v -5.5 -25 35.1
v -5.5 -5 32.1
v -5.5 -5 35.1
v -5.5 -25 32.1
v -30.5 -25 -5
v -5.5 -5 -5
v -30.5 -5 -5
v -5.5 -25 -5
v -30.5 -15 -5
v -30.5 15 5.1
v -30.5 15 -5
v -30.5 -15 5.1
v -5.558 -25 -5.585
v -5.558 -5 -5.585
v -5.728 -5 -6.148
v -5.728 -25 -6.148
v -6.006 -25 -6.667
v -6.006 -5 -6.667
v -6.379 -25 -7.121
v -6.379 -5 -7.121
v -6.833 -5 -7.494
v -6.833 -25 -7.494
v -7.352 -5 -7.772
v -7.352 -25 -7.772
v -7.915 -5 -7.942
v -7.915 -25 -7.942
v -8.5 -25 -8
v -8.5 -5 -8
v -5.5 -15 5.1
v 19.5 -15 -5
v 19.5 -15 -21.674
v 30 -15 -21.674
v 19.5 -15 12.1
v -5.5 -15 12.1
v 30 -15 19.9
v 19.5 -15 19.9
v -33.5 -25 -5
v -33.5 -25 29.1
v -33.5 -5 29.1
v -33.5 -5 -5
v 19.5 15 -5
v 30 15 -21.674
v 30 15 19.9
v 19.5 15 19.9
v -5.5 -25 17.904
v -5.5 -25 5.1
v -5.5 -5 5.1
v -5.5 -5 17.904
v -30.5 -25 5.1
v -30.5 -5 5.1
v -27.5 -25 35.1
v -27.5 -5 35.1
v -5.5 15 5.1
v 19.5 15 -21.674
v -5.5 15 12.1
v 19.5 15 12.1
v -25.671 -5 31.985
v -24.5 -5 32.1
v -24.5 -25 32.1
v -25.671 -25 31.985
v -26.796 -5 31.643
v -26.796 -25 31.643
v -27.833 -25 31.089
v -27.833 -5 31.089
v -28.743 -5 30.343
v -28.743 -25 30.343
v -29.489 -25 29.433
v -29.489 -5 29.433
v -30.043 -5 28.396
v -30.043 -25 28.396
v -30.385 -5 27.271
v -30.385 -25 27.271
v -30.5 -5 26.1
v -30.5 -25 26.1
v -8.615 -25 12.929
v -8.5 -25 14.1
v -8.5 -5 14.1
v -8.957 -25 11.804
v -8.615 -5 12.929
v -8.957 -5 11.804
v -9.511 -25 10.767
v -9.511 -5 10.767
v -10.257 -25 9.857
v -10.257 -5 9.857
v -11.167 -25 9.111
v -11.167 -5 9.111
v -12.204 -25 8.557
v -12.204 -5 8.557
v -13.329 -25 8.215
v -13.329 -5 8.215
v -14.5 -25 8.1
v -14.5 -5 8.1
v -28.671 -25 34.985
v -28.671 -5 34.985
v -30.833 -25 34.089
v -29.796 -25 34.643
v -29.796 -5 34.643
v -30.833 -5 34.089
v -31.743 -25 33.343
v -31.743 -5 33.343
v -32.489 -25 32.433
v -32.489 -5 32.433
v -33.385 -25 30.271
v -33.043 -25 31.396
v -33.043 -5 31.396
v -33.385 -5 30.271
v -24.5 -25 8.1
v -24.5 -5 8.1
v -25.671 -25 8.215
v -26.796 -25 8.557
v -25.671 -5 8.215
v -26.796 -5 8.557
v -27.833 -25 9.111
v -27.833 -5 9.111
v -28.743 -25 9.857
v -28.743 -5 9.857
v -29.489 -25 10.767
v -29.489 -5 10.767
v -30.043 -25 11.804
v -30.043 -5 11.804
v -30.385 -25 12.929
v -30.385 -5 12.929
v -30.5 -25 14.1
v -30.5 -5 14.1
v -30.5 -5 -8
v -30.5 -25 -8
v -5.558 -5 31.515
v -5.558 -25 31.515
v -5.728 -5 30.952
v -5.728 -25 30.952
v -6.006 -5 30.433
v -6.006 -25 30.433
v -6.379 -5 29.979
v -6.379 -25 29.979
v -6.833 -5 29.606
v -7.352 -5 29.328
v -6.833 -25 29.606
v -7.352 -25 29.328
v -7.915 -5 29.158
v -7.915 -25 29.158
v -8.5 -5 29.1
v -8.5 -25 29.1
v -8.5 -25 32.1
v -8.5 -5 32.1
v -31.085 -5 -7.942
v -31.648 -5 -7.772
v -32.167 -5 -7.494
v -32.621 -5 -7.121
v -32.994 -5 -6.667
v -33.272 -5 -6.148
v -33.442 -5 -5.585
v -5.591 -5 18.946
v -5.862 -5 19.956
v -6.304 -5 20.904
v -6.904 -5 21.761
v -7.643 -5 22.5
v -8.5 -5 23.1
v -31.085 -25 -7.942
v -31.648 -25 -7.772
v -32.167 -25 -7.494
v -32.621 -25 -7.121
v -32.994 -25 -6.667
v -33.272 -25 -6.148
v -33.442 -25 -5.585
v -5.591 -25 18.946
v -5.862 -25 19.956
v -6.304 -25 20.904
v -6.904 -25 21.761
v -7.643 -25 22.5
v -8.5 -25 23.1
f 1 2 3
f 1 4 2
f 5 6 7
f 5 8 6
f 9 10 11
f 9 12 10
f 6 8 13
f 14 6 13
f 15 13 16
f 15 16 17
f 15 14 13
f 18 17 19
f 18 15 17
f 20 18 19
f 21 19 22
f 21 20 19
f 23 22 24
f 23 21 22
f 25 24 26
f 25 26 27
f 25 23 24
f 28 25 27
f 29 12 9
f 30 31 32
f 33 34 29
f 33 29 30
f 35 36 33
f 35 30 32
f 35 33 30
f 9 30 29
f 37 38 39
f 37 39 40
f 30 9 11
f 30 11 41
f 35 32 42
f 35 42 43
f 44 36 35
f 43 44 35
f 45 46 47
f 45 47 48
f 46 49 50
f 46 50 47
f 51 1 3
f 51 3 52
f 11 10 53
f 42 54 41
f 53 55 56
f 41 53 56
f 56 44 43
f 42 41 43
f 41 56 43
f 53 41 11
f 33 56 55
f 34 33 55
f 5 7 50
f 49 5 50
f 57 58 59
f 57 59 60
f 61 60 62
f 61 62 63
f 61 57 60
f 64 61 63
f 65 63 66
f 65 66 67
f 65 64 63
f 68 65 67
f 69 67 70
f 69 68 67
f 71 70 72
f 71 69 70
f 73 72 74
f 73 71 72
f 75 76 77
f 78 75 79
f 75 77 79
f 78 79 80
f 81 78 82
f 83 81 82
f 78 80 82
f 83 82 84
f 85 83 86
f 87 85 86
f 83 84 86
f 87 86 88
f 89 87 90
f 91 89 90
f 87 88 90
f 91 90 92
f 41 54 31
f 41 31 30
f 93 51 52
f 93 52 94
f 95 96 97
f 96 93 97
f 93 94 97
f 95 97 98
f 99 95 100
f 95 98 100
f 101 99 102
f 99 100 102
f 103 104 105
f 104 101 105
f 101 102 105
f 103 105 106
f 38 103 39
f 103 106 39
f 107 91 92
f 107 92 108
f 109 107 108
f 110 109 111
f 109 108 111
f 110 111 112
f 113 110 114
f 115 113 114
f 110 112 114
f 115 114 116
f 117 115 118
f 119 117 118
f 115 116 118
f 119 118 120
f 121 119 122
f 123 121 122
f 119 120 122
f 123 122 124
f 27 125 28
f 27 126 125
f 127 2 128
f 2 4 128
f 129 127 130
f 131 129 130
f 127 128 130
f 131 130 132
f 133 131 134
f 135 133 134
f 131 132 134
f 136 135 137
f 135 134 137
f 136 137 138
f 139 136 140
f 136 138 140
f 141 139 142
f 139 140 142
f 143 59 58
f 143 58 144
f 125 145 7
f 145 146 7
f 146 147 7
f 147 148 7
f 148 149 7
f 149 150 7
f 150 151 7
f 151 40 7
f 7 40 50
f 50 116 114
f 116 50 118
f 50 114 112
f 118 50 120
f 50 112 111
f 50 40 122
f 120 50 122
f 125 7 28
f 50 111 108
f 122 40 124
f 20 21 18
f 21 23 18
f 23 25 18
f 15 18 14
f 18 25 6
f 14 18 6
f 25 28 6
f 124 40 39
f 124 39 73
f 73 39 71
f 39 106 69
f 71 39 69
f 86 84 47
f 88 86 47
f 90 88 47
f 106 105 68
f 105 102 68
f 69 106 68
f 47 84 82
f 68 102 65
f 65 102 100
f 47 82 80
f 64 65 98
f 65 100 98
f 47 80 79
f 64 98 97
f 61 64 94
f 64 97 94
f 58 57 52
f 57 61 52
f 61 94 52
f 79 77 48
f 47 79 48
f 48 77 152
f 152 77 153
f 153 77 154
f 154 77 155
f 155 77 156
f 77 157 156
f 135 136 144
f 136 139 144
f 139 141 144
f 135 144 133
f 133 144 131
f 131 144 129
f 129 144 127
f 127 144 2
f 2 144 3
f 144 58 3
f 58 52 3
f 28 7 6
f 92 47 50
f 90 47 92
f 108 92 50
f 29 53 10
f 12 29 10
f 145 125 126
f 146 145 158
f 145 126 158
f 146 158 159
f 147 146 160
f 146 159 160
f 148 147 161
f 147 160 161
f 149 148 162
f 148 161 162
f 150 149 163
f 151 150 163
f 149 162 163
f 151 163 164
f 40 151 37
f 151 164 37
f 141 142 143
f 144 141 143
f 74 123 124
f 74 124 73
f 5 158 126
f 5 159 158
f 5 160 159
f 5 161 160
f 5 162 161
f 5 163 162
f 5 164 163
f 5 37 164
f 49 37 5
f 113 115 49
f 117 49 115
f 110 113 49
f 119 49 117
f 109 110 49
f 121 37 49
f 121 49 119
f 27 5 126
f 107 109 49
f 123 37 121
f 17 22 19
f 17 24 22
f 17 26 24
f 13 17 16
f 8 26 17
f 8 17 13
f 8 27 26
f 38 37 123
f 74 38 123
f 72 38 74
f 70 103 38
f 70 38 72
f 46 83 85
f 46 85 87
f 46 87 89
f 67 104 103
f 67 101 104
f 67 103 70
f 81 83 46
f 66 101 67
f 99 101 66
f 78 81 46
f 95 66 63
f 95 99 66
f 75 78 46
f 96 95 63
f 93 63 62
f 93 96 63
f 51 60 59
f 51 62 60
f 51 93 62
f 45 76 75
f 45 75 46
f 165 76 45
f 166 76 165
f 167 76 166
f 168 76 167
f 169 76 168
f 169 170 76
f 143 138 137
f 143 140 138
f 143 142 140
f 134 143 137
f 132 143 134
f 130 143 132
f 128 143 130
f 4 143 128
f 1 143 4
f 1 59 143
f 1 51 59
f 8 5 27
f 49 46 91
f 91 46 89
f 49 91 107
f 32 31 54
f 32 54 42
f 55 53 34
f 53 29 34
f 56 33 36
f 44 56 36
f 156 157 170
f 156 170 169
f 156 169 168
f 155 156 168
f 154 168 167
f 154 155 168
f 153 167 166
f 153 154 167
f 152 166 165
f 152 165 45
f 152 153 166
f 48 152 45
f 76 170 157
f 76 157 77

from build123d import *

# Parameters (mm, degrees)
F0_W          = 25
F0_H          = 7
F0_W_2        = 10.5
F0_H_2        = 10.1
F0_H_3        = 16.6735936701
F0_H_4        = 7.8
F1_DEPTH      = 15
F1_DEPTH_BACK = 15
F2_W          = 3
F2_H          = 3
F3_DEPTH      = 10
F3_DEPTH_BACK = 10
F4_T1_DEPTH   = 20
F4_T3_DEPTH   = 20
F4_T5_DEPTH   = 20
F4_T7_DEPTH   = 50
F4_T9_DEPTH   = 45.9807621135
F5_R          = 2.99999


# Not quite as in the source:
# - a fillet or chamfer that OpenCascade refuses, or shapes differently, is made with other operations: its cross-section is extruded or revolved along the edge and cut away or added
# - a fillet or chamfer is up to 0.001 mm smaller than in the source, because OpenCascade refuses the exact size
# - a feature names something its author has since deleted; it is built from what else it names


with BuildPart() as f1:
    # F0 (on Front) → F1 (new body, two sides)
    with BuildSketch(Plane.XZ) as f1_sk:
        Polygon((-5.5, 5.1), (-30.5, 5.1), (-30.5, -5), (19.5, -5), (19.5, 5.1), align=None)
        with Locations((7, 8.6)):
            Rectangle(F0_W, F0_H)
        with Locations((24.75, 8.6)):
            Rectangle(F0_W_2, F0_H)
        with Locations((24.75, 0.05)):
            Rectangle(F0_W_2, F0_H_2)
        with Locations((24.75, -13.3367968351)):
            Rectangle(F0_W_2, F0_H_3)
        with Locations((24.75, 16)):
            Rectangle(F0_W_2, F0_H_4)
    extrude(amount=F1_DEPTH)
    extrude(f1_sk.sketch, amount=-F1_DEPTH_BACK)


with BuildPart() as f3:
    # F2 (on face) → F3 (new body, two sides)
    with BuildSketch(Plane.XZ.offset(15)) as f3_sk:
        Polygon((-30.5, -5), (-30.5, 5.1), (-5.5, 5.1), (-5.5, 12.1), (-5.5, 23.1), (-8.5, 23.1), (-8.5, 15.1), (-8.5, 8.1), (-30.5, 8.1), (-30.5, 32.1), (-8.5, 32.1), (-5.5, 32.1), (-5.5, 35.1), (-33.5, 35.1), (-33.5, 8.1), (-33.5, -5), (-33.5, -8), (-5.5, -8), (-5.5, -5), align=None)
        with Locations((-7, 30.6)):
            Rectangle(F2_W, F2_H)
    extrude(amount=F3_DEPTH)
    extrude(f3_sk.sketch, amount=-F3_DEPTH_BACK)

    # F4: fillet of radius 6 on 5 edges, made by hand

    # F4_s2 → F4_t1 (join)
    with BuildSketch(Plane.XZ.offset(5)):
        with BuildLine():
            ThreePointArc((-24.5, 32.1), (-28.7426406871, 30.3426406871), (-30.5, 26.1))
            Line((-30.5, 26.1), (-30.5, 32.1))
            Line((-30.5, 32.1), (-24.5, 32.1))
        make_face()
    extrude(amount=F4_T1_DEPTH)

    # F4_s4 → F4_t3 (join)
    with BuildSketch(Plane.XZ.offset(5)):
        with BuildLine():
            ThreePointArc((-24.5, 8.1), (-28.7426406871, 9.8573593129), (-30.5, 14.1))
            Line((-30.5, 14.1), (-30.5, 8.1))
            Line((-30.5, 8.1), (-24.5, 8.1))
        make_face()
    extrude(amount=F4_T3_DEPTH)

    # F4_s6 → F4_t5 (join)
    with BuildSketch(Plane.XZ.offset(5)):
        with BuildLine():
            ThreePointArc((-8.5, 14.1), (-10.2573593129, 9.8573593129), (-14.5, 8.1))
            Line((-14.5, 8.1), (-8.5, 8.1))
            Line((-8.5, 8.1), (-8.5, 14.1))
        make_face()
    extrude(amount=F4_T5_DEPTH)

    # F4_s8 → F4_t7 (cut)
    with BuildSketch(Plane.XZ.offset(-10)):
        with BuildLine():
            ThreePointArc((-27.5, 35.1), (-31.7426406871, 33.3426406871), (-33.5, 29.1))
            Line((-33.5, 29.1), (-33.5, 35.1))
            Line((-33.5, 35.1), (-27.5, 35.1))
        make_face()
    extrude(amount=F4_T7_DEPTH, mode=Mode.SUBTRACT)

    # F4_s10 → F4_t9 (cut)
    with BuildSketch(Plane.XZ.offset(-7.9903810568)):
        with BuildLine():
            ThreePointArc((-8.5, 23.1), (-6.3038475773, 20.9038475773), (-5.5, 17.9038475773))
            Line((-5.5, 17.9038475773), (-5.5, 23.1))
            Line((-5.5, 23.1), (-8.5, 23.1))
        make_face()
    extrude(amount=F4_T9_DEPTH, mode=Mode.SUBTRACT)

    # F5 (radius 3 in the source; OpenCascade refuses exactly that, so slightly less here)
    f5_edges = [f3.edges().sort_by_distance(p)[0] for p in [
        (-33.5, -15, -8),
        (-5.5, -15, 29.1),
        (-5.5, -15, -8),
    ]]
    fillet(f5_edges, radius=F5_R)


solid = Compound([f1.part, f3.part])
